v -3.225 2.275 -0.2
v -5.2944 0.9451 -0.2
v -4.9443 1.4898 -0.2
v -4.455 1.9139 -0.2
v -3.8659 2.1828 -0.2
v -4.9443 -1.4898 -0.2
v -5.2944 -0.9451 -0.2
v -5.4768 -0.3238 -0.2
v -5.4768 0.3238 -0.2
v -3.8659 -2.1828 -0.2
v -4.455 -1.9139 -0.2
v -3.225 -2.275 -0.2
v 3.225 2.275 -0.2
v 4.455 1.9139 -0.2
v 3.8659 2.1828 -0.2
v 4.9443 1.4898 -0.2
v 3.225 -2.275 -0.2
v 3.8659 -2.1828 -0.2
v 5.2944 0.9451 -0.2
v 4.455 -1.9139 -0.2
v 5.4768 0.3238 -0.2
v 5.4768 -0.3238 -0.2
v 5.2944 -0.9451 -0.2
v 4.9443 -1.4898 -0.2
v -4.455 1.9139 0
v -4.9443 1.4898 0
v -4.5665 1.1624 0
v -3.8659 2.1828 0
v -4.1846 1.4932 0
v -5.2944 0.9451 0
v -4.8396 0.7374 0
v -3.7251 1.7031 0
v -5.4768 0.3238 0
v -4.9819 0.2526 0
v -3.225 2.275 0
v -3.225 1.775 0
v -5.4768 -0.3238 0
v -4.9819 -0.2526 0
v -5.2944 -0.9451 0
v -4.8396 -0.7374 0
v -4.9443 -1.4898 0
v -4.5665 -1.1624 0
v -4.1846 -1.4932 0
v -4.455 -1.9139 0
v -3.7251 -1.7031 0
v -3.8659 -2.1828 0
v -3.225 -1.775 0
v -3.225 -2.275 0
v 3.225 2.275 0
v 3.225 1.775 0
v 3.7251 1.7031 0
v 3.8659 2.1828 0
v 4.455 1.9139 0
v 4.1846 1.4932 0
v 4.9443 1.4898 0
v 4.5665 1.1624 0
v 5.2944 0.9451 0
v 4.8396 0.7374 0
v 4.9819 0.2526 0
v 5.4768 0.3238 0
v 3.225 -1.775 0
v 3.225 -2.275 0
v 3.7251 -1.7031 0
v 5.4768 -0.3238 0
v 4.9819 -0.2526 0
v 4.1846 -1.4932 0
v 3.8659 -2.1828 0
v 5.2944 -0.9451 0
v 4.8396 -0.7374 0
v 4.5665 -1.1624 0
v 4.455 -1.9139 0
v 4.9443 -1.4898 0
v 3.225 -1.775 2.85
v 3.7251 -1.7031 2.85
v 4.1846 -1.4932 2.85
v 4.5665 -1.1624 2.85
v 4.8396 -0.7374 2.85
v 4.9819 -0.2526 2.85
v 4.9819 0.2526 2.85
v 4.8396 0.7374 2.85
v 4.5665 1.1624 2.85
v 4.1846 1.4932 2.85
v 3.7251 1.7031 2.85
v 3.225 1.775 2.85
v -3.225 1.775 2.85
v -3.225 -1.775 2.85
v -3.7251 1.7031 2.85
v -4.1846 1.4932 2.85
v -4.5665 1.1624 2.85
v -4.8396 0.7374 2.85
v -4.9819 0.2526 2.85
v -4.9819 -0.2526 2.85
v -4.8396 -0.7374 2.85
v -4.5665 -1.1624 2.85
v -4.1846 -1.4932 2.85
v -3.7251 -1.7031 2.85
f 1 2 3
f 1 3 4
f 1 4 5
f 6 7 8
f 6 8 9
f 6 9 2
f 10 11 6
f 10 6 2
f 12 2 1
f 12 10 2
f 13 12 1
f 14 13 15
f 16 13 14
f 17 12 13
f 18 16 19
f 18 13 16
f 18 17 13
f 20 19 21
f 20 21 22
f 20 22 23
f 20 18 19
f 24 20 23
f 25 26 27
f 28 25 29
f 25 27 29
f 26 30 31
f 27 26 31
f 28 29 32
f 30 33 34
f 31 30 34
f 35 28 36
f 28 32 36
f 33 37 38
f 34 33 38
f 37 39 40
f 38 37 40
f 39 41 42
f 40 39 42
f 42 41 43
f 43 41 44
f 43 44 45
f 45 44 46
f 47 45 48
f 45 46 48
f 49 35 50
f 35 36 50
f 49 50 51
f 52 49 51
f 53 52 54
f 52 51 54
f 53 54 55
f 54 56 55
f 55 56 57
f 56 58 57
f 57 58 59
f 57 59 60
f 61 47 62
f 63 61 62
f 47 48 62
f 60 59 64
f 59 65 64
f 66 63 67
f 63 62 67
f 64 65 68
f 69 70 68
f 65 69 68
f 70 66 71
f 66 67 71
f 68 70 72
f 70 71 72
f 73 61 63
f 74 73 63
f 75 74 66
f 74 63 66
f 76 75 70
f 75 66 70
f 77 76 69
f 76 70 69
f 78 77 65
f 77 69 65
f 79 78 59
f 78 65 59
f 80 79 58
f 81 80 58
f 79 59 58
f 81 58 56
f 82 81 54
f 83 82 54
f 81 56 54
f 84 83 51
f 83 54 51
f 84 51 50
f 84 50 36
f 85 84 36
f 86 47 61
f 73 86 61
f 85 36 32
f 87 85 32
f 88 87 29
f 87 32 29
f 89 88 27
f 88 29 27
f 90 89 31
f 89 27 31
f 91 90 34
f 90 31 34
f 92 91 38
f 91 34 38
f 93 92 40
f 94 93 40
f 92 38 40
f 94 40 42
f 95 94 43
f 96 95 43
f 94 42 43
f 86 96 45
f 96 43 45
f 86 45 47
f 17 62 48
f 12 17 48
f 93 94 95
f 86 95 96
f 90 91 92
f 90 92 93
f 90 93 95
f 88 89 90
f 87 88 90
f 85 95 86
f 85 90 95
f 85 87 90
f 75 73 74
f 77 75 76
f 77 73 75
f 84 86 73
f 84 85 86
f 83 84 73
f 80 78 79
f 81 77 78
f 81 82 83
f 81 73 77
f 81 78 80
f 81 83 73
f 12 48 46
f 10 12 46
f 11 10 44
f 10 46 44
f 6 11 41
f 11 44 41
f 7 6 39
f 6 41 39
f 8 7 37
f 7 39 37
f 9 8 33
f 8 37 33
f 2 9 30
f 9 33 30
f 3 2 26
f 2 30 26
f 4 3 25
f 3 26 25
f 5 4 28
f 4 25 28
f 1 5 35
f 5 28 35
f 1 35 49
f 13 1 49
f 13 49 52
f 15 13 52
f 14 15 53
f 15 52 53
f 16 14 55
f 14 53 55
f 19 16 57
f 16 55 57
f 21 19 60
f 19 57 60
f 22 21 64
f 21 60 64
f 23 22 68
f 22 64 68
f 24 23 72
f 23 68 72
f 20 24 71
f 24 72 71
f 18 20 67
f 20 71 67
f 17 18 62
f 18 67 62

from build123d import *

# Parameters (mm, degrees)
F1_DEPTH = 2.85
F3_DEPTH = 0.2


with BuildPart() as f1:
    # F0 (on Top) → F1 (new body)
    with BuildSketch(Plane.XY):
        with BuildLine():
            Line((-3.225, -1.775), (3.225, -1.775))
            ThreePointArc((3.225, -1.775), (5, 0), (3.225, 1.775))
            Line((3.225, 1.775), (-3.225, 1.775))
            ThreePointArc((-3.225, 1.775), (-5, 0), (-3.225, -1.775))
        make_face()
    extrude(amount=F1_DEPTH)

    # F2 (on face) → F3 (join)
    with BuildSketch(Plane(origin=(0, 0, 0), x_dir=(1, 0, 0), z_dir=(0, 0, -1))):
        with BuildLine():
            Line((-3.225, -2.275), (3.225, -2.275))
            ThreePointArc((3.225, -2.275), (5.5, 0), (3.225, 2.275))
            Line((3.225, 2.275), (-3.225, 2.275))
            ThreePointArc((-3.225, 2.275), (-5.5, 0), (-3.225, -2.275))
        make_face()
    extrude(amount=F3_DEPTH)


solid = f1.part
